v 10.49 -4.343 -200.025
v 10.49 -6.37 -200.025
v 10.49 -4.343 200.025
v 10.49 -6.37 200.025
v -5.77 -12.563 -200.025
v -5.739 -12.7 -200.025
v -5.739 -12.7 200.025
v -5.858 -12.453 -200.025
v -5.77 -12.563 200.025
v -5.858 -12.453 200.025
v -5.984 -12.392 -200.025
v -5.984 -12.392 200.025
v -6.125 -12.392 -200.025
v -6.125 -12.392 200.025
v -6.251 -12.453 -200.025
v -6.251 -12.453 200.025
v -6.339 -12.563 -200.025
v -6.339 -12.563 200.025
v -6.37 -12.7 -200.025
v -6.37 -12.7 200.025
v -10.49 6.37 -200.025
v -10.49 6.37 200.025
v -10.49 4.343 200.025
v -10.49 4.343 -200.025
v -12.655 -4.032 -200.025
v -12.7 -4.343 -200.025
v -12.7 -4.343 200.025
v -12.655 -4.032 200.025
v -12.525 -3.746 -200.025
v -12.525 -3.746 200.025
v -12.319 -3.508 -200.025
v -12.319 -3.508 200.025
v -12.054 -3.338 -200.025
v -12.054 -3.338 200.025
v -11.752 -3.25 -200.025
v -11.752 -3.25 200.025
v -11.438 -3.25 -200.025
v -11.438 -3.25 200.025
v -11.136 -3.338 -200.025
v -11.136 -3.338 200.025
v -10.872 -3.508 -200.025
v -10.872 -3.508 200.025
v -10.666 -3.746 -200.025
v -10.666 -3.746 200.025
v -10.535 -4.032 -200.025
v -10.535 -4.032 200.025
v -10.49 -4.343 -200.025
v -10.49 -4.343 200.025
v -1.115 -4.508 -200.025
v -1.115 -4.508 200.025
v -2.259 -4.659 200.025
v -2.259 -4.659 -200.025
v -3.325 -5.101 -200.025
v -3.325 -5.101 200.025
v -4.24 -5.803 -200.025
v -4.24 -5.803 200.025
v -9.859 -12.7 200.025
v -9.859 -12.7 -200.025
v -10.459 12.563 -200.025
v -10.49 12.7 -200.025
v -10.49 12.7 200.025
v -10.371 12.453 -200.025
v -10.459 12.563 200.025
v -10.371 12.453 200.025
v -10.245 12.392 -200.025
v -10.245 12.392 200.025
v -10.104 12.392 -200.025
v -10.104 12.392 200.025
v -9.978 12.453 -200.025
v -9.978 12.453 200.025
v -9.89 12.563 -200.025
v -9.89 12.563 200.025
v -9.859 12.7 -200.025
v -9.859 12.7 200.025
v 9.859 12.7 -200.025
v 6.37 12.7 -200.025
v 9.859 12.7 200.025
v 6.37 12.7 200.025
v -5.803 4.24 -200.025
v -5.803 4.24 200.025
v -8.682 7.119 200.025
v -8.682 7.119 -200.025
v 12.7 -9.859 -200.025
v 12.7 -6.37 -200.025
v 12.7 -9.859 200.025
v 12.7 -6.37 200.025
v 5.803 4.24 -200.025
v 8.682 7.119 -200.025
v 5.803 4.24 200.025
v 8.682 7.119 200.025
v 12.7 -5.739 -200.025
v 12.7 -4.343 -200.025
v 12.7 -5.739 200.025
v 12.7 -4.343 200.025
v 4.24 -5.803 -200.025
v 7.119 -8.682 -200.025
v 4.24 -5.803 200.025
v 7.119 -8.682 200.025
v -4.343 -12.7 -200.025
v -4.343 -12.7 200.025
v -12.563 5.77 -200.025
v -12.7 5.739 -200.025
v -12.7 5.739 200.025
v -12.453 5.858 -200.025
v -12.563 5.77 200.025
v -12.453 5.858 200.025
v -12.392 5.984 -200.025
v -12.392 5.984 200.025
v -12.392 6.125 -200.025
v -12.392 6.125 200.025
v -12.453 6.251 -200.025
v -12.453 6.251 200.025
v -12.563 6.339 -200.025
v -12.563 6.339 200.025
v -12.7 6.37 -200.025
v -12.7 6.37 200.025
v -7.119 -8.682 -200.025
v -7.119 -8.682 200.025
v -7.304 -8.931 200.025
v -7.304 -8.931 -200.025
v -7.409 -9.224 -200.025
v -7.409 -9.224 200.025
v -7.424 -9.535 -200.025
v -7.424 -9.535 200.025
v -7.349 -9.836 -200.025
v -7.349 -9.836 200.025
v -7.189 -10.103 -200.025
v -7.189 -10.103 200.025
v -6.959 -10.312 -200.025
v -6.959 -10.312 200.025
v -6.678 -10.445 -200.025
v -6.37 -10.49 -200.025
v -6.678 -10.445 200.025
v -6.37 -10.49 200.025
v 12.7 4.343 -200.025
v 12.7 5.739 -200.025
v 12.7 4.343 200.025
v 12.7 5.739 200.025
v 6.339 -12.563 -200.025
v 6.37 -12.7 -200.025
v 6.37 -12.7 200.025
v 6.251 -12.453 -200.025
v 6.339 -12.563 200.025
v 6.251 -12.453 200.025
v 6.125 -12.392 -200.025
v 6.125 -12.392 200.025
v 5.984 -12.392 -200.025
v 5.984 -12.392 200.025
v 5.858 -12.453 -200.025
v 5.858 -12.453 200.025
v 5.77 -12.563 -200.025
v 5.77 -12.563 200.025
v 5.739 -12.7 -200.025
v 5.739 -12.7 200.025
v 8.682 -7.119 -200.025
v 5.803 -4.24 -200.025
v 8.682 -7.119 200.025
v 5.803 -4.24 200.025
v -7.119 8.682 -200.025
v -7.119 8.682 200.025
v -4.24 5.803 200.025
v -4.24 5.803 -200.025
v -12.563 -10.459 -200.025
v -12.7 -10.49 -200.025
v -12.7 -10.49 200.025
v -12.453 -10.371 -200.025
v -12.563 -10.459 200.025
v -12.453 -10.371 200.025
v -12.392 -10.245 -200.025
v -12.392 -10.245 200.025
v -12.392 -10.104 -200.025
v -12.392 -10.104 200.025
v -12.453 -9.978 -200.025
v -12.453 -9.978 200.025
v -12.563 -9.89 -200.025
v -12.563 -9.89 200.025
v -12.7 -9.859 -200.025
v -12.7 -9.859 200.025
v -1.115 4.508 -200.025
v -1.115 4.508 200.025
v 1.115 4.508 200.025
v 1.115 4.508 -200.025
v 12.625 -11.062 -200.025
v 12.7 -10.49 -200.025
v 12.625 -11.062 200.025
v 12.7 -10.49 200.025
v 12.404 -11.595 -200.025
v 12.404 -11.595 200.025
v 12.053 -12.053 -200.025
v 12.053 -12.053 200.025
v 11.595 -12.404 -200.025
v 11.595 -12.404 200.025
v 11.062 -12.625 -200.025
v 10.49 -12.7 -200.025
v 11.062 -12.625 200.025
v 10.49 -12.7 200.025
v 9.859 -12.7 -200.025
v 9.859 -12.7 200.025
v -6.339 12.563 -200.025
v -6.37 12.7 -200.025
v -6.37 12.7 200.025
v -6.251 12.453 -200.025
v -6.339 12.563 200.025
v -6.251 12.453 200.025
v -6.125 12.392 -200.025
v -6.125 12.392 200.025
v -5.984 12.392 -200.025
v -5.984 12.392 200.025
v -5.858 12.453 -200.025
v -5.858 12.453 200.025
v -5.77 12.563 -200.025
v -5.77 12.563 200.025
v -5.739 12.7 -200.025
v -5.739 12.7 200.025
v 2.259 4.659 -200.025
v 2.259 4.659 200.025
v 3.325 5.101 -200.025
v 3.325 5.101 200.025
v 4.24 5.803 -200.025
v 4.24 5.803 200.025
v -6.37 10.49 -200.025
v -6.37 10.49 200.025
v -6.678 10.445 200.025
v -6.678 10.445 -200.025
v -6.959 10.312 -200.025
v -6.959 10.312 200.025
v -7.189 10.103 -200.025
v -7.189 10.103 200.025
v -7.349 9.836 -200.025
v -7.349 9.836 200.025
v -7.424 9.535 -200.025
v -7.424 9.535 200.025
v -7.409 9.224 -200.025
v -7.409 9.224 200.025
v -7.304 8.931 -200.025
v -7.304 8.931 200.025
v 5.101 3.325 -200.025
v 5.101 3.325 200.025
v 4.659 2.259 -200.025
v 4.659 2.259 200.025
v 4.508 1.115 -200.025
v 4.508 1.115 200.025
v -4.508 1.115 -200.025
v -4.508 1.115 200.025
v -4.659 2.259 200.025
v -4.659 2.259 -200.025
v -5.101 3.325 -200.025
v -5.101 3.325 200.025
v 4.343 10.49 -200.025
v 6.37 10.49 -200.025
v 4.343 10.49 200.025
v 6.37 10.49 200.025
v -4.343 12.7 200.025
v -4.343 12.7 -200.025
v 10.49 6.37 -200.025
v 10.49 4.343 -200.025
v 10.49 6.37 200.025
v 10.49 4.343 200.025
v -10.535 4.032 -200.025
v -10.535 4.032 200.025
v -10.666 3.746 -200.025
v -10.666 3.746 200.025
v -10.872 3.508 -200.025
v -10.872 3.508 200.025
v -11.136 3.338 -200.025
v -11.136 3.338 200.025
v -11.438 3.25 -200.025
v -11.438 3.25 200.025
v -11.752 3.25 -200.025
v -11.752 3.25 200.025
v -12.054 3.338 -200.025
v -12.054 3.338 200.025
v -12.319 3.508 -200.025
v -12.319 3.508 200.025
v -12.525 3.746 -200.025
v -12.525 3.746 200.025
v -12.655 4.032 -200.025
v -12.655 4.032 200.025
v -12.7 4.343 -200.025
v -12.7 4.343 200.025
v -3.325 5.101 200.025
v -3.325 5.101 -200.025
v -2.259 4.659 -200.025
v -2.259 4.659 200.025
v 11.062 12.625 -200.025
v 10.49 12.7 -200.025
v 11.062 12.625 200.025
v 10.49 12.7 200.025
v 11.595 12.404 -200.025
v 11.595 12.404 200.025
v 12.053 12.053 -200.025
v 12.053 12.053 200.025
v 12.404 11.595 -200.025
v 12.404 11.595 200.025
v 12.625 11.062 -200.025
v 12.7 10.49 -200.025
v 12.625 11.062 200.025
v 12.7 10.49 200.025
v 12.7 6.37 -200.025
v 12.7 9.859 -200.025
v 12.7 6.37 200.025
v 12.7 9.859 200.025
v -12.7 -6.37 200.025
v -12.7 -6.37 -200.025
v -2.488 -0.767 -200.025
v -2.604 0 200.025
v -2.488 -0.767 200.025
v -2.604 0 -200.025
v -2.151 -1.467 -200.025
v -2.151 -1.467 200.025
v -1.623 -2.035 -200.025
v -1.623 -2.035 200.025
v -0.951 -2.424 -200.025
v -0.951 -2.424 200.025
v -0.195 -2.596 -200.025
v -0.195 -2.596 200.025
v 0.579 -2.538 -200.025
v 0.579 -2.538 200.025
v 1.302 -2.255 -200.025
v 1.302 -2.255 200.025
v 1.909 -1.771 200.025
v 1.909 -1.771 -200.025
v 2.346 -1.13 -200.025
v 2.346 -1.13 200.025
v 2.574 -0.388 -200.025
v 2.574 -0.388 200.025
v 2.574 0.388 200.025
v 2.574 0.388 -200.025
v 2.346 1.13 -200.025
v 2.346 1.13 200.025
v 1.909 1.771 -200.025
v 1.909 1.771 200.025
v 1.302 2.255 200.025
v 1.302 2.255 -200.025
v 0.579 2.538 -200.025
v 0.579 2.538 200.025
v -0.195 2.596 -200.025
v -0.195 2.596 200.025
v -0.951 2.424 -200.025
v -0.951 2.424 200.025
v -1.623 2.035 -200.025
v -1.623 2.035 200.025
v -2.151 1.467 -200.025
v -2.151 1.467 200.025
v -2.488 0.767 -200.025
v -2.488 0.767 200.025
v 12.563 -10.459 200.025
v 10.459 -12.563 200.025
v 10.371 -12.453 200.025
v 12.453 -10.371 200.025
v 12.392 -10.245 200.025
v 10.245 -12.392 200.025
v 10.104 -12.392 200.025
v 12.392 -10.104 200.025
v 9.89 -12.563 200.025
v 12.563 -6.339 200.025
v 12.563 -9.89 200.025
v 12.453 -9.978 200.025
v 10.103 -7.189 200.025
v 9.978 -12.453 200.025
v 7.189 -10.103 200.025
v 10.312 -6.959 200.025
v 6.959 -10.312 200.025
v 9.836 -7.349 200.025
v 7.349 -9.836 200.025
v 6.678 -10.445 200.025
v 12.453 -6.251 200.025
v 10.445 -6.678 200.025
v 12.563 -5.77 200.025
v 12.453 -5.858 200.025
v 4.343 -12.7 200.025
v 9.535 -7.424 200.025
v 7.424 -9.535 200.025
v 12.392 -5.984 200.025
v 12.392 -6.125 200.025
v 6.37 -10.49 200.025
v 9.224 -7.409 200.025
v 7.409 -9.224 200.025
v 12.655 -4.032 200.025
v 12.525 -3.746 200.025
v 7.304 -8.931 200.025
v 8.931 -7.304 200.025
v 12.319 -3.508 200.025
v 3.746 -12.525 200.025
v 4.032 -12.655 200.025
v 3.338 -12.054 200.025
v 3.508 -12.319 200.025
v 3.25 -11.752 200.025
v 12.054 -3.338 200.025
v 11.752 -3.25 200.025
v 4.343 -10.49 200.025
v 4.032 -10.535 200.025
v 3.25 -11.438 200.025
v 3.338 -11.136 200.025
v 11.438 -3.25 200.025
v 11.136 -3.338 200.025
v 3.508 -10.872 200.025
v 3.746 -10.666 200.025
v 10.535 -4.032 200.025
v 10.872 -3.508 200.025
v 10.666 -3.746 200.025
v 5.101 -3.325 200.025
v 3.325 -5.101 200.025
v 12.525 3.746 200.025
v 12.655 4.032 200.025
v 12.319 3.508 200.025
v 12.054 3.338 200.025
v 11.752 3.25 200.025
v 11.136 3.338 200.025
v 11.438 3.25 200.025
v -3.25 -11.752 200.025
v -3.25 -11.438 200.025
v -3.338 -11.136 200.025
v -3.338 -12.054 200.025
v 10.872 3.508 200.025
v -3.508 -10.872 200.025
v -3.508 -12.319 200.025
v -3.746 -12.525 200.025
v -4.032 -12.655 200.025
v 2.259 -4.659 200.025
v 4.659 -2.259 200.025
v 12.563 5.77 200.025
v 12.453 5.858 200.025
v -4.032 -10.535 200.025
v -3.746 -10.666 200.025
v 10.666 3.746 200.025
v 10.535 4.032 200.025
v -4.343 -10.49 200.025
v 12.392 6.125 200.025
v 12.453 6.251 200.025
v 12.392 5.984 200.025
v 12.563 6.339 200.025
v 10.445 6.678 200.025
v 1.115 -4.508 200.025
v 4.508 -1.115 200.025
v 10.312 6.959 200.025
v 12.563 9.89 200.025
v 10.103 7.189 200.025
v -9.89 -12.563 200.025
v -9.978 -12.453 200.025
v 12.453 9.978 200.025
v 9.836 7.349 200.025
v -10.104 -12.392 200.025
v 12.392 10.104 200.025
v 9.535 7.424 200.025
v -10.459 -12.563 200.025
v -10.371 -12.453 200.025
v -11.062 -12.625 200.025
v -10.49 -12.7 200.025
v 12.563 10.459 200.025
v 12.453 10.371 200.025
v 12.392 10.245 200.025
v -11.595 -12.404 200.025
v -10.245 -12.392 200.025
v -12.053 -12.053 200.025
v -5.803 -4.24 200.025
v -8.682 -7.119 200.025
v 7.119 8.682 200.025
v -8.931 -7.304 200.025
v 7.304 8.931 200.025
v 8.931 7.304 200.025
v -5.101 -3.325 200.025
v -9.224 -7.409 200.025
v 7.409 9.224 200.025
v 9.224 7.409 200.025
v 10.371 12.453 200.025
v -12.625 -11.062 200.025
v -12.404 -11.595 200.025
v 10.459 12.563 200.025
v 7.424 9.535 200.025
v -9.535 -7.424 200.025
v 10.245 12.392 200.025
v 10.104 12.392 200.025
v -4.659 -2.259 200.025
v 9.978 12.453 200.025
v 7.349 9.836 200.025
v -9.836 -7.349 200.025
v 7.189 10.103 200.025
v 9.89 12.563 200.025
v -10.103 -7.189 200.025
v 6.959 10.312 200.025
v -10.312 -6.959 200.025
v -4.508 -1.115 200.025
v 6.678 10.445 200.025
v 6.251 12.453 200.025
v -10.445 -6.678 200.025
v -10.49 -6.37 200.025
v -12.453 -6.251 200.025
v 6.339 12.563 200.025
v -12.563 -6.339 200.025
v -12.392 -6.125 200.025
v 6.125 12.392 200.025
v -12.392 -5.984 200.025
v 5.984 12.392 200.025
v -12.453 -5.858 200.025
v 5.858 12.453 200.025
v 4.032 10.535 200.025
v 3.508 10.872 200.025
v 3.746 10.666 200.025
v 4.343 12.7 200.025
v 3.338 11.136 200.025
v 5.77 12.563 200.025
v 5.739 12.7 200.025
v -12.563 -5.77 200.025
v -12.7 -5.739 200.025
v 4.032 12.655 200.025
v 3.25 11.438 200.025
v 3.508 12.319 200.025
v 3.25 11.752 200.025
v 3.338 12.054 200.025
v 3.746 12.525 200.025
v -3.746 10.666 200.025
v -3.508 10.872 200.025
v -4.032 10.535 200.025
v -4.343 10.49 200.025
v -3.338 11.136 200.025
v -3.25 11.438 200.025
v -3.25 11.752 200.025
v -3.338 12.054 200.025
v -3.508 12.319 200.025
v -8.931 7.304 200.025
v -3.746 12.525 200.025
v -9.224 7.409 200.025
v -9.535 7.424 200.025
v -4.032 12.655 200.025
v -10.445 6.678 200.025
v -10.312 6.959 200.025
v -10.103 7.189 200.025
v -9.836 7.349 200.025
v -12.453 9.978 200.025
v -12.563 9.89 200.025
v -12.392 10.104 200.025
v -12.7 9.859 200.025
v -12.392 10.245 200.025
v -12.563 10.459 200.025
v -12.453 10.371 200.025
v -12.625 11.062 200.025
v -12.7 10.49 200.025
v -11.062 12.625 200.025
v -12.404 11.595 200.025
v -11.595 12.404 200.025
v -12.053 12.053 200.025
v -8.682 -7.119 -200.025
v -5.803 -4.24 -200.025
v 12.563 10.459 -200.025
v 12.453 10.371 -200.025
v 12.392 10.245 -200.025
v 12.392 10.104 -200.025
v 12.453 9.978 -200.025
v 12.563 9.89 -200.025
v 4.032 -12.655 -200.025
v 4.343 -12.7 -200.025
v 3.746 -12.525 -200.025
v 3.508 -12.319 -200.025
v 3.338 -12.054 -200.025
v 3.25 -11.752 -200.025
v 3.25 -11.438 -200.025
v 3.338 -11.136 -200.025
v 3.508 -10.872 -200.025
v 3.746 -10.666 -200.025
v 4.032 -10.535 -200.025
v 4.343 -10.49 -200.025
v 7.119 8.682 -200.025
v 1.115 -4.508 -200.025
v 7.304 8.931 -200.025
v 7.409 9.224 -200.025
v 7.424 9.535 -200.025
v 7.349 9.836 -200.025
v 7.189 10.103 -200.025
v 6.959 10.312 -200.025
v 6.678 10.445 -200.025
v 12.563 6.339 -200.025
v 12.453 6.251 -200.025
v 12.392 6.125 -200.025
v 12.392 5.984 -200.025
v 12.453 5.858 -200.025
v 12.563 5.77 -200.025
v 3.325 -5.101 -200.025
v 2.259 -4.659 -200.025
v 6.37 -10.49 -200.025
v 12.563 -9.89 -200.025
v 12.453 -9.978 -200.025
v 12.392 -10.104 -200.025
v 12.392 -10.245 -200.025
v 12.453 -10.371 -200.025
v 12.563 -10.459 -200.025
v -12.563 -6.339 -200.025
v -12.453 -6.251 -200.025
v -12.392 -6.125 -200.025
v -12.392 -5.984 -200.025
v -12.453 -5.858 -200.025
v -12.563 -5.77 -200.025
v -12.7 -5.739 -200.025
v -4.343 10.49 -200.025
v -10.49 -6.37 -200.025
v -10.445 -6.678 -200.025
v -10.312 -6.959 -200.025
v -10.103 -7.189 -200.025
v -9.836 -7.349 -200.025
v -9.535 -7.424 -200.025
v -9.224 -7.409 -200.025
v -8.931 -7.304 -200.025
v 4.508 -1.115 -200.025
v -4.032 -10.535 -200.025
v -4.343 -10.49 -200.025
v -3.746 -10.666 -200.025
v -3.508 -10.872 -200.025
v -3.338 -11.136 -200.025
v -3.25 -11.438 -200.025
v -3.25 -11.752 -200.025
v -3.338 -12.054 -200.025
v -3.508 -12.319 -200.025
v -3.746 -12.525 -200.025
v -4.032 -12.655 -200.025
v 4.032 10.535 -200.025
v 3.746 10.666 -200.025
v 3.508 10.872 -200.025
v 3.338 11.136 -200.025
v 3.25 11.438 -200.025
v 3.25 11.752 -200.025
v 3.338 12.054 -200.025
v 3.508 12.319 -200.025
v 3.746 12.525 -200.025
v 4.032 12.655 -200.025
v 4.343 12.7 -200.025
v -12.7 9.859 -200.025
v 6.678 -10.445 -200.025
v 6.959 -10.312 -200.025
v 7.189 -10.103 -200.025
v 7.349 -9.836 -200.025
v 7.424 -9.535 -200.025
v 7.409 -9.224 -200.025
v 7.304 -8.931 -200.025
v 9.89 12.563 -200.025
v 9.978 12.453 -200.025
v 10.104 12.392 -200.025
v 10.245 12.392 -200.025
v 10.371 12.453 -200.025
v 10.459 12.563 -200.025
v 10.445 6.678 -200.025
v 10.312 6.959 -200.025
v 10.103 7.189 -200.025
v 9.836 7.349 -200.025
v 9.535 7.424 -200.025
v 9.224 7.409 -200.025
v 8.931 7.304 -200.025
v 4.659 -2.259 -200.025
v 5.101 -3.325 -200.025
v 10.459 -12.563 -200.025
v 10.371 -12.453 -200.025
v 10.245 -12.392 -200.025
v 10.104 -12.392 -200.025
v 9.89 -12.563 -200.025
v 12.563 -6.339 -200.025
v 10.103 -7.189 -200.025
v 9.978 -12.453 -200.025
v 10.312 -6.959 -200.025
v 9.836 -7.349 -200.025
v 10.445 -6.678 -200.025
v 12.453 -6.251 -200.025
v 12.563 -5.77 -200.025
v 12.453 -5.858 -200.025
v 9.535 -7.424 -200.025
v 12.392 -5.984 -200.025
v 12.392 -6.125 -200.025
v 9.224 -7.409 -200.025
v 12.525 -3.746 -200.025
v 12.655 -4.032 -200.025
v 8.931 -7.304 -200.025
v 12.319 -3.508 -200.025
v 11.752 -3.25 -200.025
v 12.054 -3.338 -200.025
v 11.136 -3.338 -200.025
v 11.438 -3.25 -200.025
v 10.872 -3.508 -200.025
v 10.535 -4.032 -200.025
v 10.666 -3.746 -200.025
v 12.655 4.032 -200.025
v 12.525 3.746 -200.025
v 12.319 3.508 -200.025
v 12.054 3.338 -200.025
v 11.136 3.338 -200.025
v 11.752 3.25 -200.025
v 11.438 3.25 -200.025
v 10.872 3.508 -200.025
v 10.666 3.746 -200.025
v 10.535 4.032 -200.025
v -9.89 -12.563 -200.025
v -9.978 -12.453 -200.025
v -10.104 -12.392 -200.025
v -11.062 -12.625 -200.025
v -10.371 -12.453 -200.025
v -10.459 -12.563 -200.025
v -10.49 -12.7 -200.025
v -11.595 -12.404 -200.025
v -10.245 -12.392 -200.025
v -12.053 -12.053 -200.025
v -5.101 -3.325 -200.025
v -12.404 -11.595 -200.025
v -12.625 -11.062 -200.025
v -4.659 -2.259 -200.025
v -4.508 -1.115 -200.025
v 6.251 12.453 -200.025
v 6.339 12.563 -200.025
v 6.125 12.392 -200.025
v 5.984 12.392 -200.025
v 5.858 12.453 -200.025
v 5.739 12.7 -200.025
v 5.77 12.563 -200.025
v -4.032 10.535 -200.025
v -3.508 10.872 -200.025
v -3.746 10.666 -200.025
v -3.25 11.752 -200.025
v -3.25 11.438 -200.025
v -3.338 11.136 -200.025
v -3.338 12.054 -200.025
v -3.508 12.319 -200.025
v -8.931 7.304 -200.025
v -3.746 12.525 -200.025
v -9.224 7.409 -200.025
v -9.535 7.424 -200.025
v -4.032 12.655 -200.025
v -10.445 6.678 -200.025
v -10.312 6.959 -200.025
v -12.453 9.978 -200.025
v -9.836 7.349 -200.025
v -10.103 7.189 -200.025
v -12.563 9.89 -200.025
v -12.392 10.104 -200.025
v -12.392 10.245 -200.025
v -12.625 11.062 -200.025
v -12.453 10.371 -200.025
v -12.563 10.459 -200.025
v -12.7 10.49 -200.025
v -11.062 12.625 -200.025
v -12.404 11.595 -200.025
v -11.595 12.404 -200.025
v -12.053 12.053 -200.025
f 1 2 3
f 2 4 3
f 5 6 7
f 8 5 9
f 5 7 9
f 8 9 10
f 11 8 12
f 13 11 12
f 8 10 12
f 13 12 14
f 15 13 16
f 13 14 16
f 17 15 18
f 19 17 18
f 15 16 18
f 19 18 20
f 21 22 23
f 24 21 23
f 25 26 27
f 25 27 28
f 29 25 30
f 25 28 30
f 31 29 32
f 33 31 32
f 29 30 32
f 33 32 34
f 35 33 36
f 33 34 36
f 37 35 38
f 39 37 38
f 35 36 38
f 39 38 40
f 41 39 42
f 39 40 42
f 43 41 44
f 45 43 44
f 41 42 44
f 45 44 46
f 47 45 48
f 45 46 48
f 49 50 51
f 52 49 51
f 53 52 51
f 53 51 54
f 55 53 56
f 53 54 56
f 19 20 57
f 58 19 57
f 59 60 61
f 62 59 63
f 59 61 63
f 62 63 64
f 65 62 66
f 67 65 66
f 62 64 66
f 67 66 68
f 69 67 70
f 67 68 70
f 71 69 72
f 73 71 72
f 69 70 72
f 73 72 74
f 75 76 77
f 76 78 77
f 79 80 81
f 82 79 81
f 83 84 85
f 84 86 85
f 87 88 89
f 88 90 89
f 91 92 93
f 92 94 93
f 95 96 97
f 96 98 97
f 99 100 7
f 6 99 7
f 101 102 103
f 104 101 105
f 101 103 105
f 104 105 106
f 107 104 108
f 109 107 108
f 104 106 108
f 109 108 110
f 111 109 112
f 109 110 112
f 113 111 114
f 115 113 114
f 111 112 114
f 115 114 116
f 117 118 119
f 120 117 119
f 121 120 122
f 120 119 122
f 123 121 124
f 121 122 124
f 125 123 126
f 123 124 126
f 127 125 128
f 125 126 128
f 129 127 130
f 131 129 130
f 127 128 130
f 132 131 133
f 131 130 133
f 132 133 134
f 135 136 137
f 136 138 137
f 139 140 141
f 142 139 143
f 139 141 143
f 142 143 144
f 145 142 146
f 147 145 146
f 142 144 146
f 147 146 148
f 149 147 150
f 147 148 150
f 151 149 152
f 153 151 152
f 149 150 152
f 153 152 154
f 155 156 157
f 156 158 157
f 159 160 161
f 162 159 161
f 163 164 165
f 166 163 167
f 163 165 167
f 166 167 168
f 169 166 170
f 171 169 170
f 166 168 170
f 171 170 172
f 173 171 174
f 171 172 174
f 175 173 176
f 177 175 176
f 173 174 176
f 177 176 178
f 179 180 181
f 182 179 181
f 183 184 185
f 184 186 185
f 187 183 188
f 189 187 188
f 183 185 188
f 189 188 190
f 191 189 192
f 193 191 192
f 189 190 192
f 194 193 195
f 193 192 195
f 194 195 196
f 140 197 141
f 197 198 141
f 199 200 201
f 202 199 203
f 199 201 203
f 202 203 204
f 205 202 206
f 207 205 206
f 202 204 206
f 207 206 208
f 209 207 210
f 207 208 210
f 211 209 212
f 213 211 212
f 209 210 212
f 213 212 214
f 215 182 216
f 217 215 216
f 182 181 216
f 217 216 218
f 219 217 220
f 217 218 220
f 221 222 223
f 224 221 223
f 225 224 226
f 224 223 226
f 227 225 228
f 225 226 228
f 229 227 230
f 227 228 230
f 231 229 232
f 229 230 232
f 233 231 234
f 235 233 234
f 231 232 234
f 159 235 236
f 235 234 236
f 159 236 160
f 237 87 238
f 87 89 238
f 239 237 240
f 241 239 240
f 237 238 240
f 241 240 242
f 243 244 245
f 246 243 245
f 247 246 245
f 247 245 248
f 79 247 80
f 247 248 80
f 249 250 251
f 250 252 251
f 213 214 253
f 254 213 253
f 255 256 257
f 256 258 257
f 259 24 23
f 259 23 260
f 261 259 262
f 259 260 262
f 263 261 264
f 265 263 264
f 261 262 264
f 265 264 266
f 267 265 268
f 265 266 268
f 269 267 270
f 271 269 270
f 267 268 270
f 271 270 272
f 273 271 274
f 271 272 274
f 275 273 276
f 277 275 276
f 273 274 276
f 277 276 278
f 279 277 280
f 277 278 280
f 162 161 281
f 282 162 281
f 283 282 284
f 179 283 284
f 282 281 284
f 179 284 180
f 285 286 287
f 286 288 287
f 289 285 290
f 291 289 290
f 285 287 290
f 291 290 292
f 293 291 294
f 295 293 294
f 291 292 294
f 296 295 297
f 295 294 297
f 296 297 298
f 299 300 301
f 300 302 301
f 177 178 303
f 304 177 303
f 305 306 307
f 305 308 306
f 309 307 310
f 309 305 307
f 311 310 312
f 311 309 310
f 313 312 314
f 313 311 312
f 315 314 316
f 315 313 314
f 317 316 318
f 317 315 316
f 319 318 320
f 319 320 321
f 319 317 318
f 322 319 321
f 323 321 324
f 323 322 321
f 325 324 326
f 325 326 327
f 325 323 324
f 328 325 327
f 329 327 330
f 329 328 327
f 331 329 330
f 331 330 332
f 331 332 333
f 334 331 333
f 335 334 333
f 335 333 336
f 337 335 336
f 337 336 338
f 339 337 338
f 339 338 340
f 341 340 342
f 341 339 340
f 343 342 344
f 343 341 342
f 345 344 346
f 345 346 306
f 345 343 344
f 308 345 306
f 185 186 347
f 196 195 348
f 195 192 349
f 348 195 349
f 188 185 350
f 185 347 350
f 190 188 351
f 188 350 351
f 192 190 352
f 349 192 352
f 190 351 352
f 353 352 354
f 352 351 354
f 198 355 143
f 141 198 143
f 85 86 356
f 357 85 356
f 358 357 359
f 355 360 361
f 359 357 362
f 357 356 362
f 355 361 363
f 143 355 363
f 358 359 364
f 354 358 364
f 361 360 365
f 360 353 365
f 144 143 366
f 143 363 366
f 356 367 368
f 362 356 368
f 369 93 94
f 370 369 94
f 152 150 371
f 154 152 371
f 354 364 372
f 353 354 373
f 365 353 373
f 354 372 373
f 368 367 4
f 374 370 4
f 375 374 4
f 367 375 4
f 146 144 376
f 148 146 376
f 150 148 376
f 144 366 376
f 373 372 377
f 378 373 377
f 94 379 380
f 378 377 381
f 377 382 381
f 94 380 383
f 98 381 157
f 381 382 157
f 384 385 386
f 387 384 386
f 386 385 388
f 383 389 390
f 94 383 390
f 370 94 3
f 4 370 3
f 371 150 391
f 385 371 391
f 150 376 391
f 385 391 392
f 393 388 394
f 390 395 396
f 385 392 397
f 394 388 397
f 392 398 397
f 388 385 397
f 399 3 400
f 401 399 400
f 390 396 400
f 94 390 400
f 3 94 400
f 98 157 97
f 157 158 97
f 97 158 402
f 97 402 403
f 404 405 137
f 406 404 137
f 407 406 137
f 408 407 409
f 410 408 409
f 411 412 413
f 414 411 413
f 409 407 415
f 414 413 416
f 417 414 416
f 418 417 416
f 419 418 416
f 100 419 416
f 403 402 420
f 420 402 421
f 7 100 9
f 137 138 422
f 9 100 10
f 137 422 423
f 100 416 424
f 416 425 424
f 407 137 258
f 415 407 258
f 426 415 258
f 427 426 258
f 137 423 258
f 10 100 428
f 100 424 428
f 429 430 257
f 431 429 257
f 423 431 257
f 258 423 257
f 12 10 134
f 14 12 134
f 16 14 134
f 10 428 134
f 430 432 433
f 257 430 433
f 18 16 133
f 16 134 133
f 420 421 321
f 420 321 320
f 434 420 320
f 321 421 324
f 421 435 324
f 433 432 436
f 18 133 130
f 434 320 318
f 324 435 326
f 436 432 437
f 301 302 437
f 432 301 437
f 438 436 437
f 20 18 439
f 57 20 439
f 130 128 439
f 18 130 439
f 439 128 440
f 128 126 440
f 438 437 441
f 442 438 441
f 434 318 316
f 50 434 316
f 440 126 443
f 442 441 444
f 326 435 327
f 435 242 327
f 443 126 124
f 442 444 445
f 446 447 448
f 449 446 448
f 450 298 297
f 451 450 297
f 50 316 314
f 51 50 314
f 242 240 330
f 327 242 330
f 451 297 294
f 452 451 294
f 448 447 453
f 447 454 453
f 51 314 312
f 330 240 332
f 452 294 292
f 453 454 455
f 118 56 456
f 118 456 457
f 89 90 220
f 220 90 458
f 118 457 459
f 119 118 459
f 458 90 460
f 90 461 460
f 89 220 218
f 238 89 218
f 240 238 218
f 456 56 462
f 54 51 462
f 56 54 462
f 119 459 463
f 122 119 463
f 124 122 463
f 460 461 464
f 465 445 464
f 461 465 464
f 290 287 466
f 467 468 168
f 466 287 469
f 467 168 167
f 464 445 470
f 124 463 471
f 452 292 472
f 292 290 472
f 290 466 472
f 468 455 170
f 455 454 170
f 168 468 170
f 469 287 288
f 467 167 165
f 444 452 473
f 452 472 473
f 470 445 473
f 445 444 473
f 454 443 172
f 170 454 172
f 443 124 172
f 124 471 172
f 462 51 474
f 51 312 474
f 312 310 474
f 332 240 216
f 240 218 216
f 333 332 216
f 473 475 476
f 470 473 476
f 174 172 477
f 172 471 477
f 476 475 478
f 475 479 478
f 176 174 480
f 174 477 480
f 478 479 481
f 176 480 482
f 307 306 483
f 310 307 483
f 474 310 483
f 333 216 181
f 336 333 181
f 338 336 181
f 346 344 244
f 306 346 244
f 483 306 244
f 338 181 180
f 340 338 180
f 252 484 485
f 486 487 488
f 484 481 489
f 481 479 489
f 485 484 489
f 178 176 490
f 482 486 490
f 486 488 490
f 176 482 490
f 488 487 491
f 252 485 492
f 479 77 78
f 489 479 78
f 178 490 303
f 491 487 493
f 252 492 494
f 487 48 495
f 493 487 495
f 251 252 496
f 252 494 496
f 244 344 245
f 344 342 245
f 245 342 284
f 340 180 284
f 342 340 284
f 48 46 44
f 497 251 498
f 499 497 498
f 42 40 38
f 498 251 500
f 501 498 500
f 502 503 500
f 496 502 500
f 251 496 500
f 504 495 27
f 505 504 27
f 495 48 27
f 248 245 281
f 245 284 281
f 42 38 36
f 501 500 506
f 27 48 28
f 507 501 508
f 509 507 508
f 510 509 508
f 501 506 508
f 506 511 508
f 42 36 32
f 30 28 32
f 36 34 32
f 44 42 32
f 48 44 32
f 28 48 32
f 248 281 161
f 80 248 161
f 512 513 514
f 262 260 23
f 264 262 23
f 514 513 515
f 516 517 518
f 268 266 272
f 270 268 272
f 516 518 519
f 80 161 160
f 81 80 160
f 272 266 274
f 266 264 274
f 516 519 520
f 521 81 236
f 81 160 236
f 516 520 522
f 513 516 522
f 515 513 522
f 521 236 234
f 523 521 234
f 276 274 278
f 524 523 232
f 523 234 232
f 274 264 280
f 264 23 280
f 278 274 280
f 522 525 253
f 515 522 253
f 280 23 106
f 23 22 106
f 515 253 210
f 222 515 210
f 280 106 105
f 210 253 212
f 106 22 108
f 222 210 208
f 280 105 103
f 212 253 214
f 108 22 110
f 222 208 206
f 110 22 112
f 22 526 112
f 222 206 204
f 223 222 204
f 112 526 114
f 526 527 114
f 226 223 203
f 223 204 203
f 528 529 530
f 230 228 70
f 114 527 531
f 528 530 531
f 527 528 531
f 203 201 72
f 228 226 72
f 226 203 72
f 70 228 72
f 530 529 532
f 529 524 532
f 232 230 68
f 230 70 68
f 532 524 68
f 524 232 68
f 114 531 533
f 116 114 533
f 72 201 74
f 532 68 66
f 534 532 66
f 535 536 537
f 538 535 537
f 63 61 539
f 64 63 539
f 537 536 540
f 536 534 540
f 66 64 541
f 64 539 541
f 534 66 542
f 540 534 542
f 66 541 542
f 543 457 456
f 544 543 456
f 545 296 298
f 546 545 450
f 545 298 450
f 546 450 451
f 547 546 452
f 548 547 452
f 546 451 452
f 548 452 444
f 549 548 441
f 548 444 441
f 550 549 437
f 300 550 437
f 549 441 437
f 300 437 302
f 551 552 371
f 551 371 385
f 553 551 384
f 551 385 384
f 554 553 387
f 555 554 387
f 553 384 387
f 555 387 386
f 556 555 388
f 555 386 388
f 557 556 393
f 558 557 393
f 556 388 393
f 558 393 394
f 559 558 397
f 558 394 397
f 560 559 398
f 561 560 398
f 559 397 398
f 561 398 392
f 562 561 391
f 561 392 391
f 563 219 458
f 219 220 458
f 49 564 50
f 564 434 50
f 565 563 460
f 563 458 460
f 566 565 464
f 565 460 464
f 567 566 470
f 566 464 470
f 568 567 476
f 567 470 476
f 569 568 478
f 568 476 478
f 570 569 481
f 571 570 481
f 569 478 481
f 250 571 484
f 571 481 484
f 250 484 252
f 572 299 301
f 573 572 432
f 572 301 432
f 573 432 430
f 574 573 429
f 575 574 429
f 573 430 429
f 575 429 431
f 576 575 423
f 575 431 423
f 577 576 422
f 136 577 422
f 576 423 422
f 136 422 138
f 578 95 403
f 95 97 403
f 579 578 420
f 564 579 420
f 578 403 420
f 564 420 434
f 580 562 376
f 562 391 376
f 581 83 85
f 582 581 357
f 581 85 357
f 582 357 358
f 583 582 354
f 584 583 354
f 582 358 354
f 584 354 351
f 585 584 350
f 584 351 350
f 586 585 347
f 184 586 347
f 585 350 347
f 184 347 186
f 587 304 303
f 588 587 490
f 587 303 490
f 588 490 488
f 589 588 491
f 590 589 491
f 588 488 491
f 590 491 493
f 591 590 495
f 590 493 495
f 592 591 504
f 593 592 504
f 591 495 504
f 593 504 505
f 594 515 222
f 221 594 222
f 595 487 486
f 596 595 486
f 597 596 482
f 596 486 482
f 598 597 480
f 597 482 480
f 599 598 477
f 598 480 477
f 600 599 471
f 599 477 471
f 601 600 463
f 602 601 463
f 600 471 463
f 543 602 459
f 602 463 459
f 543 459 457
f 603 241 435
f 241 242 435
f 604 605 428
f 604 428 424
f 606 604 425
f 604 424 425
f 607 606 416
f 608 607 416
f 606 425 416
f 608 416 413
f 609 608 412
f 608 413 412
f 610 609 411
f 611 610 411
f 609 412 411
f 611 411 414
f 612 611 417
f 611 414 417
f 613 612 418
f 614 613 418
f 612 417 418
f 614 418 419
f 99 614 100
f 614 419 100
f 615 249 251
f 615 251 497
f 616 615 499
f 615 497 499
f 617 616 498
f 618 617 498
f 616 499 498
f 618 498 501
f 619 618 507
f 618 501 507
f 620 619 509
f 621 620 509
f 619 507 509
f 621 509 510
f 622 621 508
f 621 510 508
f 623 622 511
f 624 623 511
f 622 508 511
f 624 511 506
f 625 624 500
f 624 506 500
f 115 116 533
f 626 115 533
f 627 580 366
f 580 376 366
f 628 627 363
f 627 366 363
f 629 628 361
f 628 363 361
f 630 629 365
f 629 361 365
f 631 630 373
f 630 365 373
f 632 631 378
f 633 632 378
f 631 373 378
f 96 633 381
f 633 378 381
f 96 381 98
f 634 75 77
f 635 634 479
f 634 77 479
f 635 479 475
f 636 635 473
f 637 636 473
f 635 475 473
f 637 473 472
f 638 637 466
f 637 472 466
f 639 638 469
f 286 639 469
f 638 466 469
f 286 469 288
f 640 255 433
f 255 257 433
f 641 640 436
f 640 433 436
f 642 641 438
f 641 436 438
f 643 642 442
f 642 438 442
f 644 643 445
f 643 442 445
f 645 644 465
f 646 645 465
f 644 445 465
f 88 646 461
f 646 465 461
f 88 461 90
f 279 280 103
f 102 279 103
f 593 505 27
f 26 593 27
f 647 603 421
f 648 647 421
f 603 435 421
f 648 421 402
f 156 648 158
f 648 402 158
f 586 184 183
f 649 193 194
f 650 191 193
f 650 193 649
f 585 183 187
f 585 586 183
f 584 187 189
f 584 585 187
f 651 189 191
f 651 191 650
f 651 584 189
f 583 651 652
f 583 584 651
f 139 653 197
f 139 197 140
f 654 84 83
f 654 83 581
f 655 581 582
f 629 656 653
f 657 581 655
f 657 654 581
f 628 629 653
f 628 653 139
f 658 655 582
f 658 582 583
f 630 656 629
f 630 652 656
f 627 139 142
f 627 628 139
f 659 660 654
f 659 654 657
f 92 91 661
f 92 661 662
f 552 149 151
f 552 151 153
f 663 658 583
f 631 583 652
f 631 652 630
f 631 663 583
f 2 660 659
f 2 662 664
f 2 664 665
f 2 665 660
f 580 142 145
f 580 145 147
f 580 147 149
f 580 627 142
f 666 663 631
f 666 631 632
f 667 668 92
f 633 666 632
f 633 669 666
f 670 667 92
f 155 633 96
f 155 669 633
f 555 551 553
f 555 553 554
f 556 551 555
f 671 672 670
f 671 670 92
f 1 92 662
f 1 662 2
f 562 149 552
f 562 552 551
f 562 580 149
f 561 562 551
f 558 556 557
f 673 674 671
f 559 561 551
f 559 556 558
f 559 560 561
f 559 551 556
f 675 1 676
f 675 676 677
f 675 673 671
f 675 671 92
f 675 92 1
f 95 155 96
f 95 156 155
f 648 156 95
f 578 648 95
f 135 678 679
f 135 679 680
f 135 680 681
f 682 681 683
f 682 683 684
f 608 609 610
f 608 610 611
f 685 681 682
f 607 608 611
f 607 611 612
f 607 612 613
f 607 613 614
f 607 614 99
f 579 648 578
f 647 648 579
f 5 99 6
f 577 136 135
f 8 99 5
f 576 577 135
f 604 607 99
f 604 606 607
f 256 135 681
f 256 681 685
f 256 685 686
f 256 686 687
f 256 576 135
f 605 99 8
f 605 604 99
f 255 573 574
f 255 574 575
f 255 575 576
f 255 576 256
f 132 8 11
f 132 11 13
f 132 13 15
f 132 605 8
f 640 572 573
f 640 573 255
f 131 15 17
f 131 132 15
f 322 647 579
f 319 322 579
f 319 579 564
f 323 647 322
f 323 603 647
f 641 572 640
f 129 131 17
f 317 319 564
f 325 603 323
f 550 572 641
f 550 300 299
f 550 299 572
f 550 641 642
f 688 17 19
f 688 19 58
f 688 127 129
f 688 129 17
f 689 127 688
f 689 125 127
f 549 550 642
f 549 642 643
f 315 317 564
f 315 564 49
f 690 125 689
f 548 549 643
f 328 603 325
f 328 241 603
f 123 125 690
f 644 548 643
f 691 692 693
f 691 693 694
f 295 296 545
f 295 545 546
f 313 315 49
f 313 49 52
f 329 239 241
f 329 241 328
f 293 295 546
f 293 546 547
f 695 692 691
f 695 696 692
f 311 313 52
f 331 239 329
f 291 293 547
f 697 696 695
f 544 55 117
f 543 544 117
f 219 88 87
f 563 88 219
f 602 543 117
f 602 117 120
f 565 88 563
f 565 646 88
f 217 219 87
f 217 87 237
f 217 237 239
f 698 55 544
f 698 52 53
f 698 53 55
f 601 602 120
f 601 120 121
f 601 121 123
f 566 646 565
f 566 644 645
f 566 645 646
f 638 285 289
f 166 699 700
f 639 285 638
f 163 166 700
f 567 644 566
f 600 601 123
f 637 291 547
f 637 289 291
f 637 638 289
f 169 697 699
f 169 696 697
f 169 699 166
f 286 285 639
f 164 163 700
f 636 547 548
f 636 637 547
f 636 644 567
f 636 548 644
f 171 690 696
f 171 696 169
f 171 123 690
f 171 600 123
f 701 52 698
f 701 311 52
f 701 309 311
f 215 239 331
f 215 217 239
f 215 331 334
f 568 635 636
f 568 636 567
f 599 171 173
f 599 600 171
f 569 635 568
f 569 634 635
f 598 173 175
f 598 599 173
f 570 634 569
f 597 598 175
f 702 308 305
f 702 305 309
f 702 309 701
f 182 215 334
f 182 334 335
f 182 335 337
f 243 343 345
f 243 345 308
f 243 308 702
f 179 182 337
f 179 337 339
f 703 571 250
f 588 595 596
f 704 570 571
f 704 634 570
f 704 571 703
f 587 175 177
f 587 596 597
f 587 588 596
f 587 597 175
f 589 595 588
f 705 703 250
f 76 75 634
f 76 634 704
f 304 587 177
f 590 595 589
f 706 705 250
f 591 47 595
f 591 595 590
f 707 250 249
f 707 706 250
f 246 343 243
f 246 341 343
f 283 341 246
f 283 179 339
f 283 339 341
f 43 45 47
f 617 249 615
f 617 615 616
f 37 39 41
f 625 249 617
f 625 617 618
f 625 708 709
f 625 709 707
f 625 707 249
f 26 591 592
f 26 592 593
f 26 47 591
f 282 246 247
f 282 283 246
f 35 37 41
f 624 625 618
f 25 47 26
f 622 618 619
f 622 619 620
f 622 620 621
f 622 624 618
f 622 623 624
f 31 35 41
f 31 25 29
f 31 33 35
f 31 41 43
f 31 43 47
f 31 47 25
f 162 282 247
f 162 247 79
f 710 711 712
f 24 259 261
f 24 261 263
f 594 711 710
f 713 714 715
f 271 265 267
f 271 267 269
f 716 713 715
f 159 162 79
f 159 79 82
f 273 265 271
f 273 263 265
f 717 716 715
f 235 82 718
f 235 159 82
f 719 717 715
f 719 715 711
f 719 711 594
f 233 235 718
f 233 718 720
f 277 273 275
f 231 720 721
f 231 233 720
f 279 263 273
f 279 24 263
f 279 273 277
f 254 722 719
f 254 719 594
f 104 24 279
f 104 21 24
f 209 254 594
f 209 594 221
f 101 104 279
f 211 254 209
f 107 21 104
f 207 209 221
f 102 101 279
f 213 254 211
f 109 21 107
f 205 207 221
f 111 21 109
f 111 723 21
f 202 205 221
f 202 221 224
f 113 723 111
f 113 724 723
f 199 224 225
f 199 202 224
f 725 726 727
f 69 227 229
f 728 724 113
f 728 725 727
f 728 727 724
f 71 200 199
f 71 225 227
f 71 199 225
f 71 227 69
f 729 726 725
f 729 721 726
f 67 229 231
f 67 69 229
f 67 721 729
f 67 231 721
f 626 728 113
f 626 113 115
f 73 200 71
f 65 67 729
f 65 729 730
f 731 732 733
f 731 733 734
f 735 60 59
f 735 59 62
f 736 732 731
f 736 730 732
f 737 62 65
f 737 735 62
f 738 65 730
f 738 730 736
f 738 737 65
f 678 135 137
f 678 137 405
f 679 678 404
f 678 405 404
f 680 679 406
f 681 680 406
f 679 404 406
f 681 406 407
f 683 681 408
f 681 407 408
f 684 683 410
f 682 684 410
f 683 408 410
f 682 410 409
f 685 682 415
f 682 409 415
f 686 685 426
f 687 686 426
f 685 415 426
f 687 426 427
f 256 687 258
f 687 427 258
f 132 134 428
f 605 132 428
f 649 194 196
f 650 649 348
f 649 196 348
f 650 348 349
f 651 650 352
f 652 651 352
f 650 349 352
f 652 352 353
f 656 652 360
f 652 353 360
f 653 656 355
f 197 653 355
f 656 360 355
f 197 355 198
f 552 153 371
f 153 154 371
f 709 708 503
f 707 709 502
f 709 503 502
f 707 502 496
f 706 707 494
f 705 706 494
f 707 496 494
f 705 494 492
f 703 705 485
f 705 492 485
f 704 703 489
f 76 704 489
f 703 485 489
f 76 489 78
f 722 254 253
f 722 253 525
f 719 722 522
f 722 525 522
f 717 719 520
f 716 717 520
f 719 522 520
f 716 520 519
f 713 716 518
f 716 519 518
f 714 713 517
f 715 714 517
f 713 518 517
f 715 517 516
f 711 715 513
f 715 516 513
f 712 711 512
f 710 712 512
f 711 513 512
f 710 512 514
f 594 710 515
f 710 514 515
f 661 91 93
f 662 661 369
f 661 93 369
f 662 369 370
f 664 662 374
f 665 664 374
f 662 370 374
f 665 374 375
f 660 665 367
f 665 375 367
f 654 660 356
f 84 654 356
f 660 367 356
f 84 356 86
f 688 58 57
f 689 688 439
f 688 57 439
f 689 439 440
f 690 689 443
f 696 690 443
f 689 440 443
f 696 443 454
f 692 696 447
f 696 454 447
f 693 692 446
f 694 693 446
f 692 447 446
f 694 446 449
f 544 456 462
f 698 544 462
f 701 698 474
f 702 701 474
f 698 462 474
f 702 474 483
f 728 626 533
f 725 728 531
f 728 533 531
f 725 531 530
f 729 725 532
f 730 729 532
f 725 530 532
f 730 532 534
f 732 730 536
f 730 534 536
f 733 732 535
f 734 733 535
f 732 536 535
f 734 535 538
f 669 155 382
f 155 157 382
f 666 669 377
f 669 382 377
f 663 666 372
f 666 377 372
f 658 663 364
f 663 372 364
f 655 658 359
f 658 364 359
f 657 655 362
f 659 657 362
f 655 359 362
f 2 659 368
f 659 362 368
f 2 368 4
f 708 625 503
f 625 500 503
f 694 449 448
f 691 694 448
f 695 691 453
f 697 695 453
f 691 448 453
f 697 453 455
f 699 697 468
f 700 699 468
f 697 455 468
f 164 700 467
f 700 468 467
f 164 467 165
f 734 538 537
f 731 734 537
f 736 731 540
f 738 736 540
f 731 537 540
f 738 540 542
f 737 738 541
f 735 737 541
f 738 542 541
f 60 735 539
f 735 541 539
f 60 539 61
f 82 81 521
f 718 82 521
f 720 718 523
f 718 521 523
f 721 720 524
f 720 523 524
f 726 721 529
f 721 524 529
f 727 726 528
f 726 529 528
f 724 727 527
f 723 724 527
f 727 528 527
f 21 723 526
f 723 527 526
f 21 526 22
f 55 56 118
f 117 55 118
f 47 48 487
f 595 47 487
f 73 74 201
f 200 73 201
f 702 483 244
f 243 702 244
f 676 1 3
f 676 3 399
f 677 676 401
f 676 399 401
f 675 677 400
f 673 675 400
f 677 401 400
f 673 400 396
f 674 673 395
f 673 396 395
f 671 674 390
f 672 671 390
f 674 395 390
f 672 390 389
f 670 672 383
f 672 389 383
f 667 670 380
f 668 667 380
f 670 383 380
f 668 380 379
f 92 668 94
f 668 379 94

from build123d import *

# Parameters (mm, degrees)
SKETCH3_R      = 2.6035
EXTRUDE1_DEPTH = 200.025


with BuildPart() as part:
    # Sketch3 → Extrude1 (new, symmetric)
    with BuildSketch(Plane.XY):
        with BuildLine():
            Line((-1.115277175, 4.5085), (1.115277175, 4.5085))
            ThreePointArc((1.115277175, 4.5085), (2.806584872, 4.844922018), (4.240406305, 5.80297087))
            Line((4.240406305, 5.80297087), (7.119225992, 8.681790557))
            ThreePointArc((7.119225992, 8.681790557), (7.348862413, 9.836250802), (6.370158275, 10.4902))
            Line((6.370158275, 10.4902), (4.3434, 10.4902))
            ThreePointArc((4.3434, 10.4902), (3.2385, 11.5951), (4.3434, 12.7))
            Line((4.3434, 12.7), (5.738786846, 12.7))
            ThreePointArc((5.738786846, 12.7), (6.054472561, 12.384314286), (6.370158275, 12.7))
            Line((6.370158275, 12.7), (9.858828571, 12.7))
            ThreePointArc((9.858828571, 12.7), (10.174514286, 12.384314286), (10.4902, 12.7))
            ThreePointArc((10.4902, 12.7), (12.052764565, 12.052764565), (12.7, 10.4902))
            ThreePointArc((12.7, 10.4902), (12.384314286, 10.174514286), (12.7, 9.858828571))
            Line((12.7, 9.858828571), (12.7, 6.370158275))
            ThreePointArc((12.7, 6.370158275), (12.384314286, 6.054472561), (12.7, 5.738786846))
            Line((12.7, 5.738786846), (12.7, 4.3434))
            ThreePointArc((12.7, 4.3434), (11.5951, 3.2385), (10.4902, 4.3434))
            Line((10.4902, 4.3434), (10.4902, 6.370158275))
            ThreePointArc((10.4902, 6.370158275), (9.836250802, 7.348862413), (8.681790557, 7.119225992))
            Line((8.681790557, 7.119225992), (5.80297087, 4.240406305))
            ThreePointArc((5.80297087, 4.240406305), (4.844922018, 2.806584872), (4.5085, 1.115277175))
            Line((4.5085, 1.115277175), (4.5085, -1.115277175))
            ThreePointArc((4.5085, -1.115277175), (4.844922018, -2.806584872), (5.80297087, -4.240406305))
            Line((5.80297087, -4.240406305), (8.681790557, -7.119225992))
            ThreePointArc((8.681790557, -7.119225992), (9.836250802, -7.348862413), (10.4902, -6.370158275))
            Line((10.4902, -6.370158275), (10.4902, -4.3434))
            ThreePointArc((10.4902, -4.3434), (11.5951, -3.2385), (12.7, -4.3434))
            Line((12.7, -4.3434), (12.7, -5.738786846))
            ThreePointArc((12.7, -5.738786846), (12.384314286, -6.054472561), (12.7, -6.370158275))
            Line((12.7, -6.370158275), (12.7, -9.858828571))
            ThreePointArc((12.7, -9.858828571), (12.384314286, -10.174514286), (12.7, -10.4902))
            ThreePointArc((12.7, -10.4902), (12.052764565, -12.052764565), (10.4902, -12.7))
            ThreePointArc((10.4902, -12.7), (10.174514286, -12.384314286), (9.858828571, -12.7))
            Line((9.858828571, -12.7), (6.370158275, -12.7))
            ThreePointArc((6.370158275, -12.7), (6.054472561, -12.384314286), (5.738786846, -12.7))
            Line((5.738786846, -12.7), (4.3434, -12.7))
            ThreePointArc((4.3434, -12.7), (3.2385, -11.5951), (4.3434, -10.4902))
            Line((4.3434, -10.4902), (6.370158275, -10.4902))
            ThreePointArc((6.370158275, -10.4902), (7.348862413, -9.836250802), (7.119225992, -8.681790557))
            Line((7.119225992, -8.681790557), (4.240406305, -5.80297087))
            ThreePointArc((4.240406305, -5.80297087), (2.806584872, -4.844922018), (1.115277175, -4.5085))
            Line((1.115277175, -4.5085), (-1.115277175, -4.5085))
            ThreePointArc((-1.115277175, -4.5085), (-2.806584872, -4.844922018), (-4.240406305, -5.80297087))
            Line((-4.240406305, -5.80297087), (-7.119225992, -8.681790557))
            ThreePointArc((-7.119225992, -8.681790557), (-7.348862413, -9.836250802), (-6.370158275, -10.4902))
            Line((-6.370158275, -10.4902), (-4.3434, -10.4902))
            ThreePointArc((-4.3434, -10.4902), (-3.2385, -11.5951), (-4.3434, -12.7))
            Line((-4.3434, -12.7), (-5.738786846, -12.7))
            ThreePointArc((-5.738786846, -12.7), (-6.054472561, -12.384314286), (-6.370158275, -12.7))
            Line((-6.370158275, -12.7), (-9.858828571, -12.7))
            ThreePointArc((-9.858828571, -12.7), (-10.174514286, -12.384314286), (-10.4902, -12.7))
            ThreePointArc((-10.4902, -12.7), (-12.052764565, -12.052764565), (-12.7, -10.4902))
            ThreePointArc((-12.7, -10.4902), (-12.384314286, -10.174514286), (-12.7, -9.858828571))
            Line((-12.7, -9.858828571), (-12.7, -6.370158275))
            ThreePointArc((-12.7, -6.370158275), (-12.384314286, -6.054472561), (-12.7, -5.738786846))
            Line((-12.7, -5.738786846), (-12.7, -4.3434))
            ThreePointArc((-12.7, -4.3434), (-11.5951, -3.2385), (-10.4902, -4.3434))
            Line((-10.4902, -4.3434), (-10.4902, -6.370158275))
            ThreePointArc((-10.4902, -6.370158275), (-9.836250802, -7.348862413), (-8.681790557, -7.119225992))
            Line((-8.681790557, -7.119225992), (-5.80297087, -4.240406305))
            ThreePointArc((-5.80297087, -4.240406305), (-4.844922018, -2.806584872), (-4.5085, -1.115277175))
            Line((-4.5085, -1.115277175), (-4.5085, 1.115277175))
            ThreePointArc((-4.5085, 1.115277175), (-4.844922018, 2.806584872), (-5.80297087, 4.240406305))
            Line((-5.80297087, 4.240406305), (-8.681790557, 7.119225992))
            ThreePointArc((-8.681790557, 7.119225992), (-9.836250802, 7.348862413), (-10.4902, 6.370158275))
            Line((-10.4902, 6.370158275), (-10.4902, 4.3434))
            ThreePointArc((-10.4902, 4.3434), (-11.5951, 3.2385), (-12.7, 4.3434))
            Line((-12.7, 4.3434), (-12.7, 5.738786846))
            ThreePointArc((-12.7, 5.738786846), (-12.384314286, 6.054472561), (-12.7, 6.370158275))
            Line((-12.7, 6.370158275), (-12.7, 9.858828571))
            ThreePointArc((-12.7, 9.858828571), (-12.384314286, 10.174514286), (-12.7, 10.4902))
            ThreePointArc((-12.7, 10.4902), (-12.052764565, 12.052764565), (-10.4902, 12.7))
            ThreePointArc((-10.4902, 12.7), (-10.174514286, 12.384314286), (-9.858828571, 12.7))
            Line((-9.858828571, 12.7), (-6.370158275, 12.7))
            ThreePointArc((-6.370158275, 12.7), (-6.054472561, 12.384314286), (-5.738786846, 12.7))
            Line((-5.738786846, 12.7), (-4.3434, 12.7))
            ThreePointArc((-4.3434, 12.7), (-3.2385, 11.5951), (-4.3434, 10.4902))
            Line((-4.3434, 10.4902), (-6.370158275, 10.4902))
            ThreePointArc((-6.370158275, 10.4902), (-7.348862413, 9.836250802), (-7.119225992, 8.681790557))
            Line((-7.119225992, 8.681790557), (-4.240406305, 5.80297087))
            ThreePointArc((-4.240406305, 5.80297087), (-2.806584872, 4.844922018), (-1.115277175, 4.5085))
        make_face()
        with Locations(Location((0, 0, 0), (0, 0, 180))):
            Circle(SKETCH3_R, mode=Mode.SUBTRACT)
    extrude(amount=EXTRUDE1_DEPTH, both=True)


solid = part.part
